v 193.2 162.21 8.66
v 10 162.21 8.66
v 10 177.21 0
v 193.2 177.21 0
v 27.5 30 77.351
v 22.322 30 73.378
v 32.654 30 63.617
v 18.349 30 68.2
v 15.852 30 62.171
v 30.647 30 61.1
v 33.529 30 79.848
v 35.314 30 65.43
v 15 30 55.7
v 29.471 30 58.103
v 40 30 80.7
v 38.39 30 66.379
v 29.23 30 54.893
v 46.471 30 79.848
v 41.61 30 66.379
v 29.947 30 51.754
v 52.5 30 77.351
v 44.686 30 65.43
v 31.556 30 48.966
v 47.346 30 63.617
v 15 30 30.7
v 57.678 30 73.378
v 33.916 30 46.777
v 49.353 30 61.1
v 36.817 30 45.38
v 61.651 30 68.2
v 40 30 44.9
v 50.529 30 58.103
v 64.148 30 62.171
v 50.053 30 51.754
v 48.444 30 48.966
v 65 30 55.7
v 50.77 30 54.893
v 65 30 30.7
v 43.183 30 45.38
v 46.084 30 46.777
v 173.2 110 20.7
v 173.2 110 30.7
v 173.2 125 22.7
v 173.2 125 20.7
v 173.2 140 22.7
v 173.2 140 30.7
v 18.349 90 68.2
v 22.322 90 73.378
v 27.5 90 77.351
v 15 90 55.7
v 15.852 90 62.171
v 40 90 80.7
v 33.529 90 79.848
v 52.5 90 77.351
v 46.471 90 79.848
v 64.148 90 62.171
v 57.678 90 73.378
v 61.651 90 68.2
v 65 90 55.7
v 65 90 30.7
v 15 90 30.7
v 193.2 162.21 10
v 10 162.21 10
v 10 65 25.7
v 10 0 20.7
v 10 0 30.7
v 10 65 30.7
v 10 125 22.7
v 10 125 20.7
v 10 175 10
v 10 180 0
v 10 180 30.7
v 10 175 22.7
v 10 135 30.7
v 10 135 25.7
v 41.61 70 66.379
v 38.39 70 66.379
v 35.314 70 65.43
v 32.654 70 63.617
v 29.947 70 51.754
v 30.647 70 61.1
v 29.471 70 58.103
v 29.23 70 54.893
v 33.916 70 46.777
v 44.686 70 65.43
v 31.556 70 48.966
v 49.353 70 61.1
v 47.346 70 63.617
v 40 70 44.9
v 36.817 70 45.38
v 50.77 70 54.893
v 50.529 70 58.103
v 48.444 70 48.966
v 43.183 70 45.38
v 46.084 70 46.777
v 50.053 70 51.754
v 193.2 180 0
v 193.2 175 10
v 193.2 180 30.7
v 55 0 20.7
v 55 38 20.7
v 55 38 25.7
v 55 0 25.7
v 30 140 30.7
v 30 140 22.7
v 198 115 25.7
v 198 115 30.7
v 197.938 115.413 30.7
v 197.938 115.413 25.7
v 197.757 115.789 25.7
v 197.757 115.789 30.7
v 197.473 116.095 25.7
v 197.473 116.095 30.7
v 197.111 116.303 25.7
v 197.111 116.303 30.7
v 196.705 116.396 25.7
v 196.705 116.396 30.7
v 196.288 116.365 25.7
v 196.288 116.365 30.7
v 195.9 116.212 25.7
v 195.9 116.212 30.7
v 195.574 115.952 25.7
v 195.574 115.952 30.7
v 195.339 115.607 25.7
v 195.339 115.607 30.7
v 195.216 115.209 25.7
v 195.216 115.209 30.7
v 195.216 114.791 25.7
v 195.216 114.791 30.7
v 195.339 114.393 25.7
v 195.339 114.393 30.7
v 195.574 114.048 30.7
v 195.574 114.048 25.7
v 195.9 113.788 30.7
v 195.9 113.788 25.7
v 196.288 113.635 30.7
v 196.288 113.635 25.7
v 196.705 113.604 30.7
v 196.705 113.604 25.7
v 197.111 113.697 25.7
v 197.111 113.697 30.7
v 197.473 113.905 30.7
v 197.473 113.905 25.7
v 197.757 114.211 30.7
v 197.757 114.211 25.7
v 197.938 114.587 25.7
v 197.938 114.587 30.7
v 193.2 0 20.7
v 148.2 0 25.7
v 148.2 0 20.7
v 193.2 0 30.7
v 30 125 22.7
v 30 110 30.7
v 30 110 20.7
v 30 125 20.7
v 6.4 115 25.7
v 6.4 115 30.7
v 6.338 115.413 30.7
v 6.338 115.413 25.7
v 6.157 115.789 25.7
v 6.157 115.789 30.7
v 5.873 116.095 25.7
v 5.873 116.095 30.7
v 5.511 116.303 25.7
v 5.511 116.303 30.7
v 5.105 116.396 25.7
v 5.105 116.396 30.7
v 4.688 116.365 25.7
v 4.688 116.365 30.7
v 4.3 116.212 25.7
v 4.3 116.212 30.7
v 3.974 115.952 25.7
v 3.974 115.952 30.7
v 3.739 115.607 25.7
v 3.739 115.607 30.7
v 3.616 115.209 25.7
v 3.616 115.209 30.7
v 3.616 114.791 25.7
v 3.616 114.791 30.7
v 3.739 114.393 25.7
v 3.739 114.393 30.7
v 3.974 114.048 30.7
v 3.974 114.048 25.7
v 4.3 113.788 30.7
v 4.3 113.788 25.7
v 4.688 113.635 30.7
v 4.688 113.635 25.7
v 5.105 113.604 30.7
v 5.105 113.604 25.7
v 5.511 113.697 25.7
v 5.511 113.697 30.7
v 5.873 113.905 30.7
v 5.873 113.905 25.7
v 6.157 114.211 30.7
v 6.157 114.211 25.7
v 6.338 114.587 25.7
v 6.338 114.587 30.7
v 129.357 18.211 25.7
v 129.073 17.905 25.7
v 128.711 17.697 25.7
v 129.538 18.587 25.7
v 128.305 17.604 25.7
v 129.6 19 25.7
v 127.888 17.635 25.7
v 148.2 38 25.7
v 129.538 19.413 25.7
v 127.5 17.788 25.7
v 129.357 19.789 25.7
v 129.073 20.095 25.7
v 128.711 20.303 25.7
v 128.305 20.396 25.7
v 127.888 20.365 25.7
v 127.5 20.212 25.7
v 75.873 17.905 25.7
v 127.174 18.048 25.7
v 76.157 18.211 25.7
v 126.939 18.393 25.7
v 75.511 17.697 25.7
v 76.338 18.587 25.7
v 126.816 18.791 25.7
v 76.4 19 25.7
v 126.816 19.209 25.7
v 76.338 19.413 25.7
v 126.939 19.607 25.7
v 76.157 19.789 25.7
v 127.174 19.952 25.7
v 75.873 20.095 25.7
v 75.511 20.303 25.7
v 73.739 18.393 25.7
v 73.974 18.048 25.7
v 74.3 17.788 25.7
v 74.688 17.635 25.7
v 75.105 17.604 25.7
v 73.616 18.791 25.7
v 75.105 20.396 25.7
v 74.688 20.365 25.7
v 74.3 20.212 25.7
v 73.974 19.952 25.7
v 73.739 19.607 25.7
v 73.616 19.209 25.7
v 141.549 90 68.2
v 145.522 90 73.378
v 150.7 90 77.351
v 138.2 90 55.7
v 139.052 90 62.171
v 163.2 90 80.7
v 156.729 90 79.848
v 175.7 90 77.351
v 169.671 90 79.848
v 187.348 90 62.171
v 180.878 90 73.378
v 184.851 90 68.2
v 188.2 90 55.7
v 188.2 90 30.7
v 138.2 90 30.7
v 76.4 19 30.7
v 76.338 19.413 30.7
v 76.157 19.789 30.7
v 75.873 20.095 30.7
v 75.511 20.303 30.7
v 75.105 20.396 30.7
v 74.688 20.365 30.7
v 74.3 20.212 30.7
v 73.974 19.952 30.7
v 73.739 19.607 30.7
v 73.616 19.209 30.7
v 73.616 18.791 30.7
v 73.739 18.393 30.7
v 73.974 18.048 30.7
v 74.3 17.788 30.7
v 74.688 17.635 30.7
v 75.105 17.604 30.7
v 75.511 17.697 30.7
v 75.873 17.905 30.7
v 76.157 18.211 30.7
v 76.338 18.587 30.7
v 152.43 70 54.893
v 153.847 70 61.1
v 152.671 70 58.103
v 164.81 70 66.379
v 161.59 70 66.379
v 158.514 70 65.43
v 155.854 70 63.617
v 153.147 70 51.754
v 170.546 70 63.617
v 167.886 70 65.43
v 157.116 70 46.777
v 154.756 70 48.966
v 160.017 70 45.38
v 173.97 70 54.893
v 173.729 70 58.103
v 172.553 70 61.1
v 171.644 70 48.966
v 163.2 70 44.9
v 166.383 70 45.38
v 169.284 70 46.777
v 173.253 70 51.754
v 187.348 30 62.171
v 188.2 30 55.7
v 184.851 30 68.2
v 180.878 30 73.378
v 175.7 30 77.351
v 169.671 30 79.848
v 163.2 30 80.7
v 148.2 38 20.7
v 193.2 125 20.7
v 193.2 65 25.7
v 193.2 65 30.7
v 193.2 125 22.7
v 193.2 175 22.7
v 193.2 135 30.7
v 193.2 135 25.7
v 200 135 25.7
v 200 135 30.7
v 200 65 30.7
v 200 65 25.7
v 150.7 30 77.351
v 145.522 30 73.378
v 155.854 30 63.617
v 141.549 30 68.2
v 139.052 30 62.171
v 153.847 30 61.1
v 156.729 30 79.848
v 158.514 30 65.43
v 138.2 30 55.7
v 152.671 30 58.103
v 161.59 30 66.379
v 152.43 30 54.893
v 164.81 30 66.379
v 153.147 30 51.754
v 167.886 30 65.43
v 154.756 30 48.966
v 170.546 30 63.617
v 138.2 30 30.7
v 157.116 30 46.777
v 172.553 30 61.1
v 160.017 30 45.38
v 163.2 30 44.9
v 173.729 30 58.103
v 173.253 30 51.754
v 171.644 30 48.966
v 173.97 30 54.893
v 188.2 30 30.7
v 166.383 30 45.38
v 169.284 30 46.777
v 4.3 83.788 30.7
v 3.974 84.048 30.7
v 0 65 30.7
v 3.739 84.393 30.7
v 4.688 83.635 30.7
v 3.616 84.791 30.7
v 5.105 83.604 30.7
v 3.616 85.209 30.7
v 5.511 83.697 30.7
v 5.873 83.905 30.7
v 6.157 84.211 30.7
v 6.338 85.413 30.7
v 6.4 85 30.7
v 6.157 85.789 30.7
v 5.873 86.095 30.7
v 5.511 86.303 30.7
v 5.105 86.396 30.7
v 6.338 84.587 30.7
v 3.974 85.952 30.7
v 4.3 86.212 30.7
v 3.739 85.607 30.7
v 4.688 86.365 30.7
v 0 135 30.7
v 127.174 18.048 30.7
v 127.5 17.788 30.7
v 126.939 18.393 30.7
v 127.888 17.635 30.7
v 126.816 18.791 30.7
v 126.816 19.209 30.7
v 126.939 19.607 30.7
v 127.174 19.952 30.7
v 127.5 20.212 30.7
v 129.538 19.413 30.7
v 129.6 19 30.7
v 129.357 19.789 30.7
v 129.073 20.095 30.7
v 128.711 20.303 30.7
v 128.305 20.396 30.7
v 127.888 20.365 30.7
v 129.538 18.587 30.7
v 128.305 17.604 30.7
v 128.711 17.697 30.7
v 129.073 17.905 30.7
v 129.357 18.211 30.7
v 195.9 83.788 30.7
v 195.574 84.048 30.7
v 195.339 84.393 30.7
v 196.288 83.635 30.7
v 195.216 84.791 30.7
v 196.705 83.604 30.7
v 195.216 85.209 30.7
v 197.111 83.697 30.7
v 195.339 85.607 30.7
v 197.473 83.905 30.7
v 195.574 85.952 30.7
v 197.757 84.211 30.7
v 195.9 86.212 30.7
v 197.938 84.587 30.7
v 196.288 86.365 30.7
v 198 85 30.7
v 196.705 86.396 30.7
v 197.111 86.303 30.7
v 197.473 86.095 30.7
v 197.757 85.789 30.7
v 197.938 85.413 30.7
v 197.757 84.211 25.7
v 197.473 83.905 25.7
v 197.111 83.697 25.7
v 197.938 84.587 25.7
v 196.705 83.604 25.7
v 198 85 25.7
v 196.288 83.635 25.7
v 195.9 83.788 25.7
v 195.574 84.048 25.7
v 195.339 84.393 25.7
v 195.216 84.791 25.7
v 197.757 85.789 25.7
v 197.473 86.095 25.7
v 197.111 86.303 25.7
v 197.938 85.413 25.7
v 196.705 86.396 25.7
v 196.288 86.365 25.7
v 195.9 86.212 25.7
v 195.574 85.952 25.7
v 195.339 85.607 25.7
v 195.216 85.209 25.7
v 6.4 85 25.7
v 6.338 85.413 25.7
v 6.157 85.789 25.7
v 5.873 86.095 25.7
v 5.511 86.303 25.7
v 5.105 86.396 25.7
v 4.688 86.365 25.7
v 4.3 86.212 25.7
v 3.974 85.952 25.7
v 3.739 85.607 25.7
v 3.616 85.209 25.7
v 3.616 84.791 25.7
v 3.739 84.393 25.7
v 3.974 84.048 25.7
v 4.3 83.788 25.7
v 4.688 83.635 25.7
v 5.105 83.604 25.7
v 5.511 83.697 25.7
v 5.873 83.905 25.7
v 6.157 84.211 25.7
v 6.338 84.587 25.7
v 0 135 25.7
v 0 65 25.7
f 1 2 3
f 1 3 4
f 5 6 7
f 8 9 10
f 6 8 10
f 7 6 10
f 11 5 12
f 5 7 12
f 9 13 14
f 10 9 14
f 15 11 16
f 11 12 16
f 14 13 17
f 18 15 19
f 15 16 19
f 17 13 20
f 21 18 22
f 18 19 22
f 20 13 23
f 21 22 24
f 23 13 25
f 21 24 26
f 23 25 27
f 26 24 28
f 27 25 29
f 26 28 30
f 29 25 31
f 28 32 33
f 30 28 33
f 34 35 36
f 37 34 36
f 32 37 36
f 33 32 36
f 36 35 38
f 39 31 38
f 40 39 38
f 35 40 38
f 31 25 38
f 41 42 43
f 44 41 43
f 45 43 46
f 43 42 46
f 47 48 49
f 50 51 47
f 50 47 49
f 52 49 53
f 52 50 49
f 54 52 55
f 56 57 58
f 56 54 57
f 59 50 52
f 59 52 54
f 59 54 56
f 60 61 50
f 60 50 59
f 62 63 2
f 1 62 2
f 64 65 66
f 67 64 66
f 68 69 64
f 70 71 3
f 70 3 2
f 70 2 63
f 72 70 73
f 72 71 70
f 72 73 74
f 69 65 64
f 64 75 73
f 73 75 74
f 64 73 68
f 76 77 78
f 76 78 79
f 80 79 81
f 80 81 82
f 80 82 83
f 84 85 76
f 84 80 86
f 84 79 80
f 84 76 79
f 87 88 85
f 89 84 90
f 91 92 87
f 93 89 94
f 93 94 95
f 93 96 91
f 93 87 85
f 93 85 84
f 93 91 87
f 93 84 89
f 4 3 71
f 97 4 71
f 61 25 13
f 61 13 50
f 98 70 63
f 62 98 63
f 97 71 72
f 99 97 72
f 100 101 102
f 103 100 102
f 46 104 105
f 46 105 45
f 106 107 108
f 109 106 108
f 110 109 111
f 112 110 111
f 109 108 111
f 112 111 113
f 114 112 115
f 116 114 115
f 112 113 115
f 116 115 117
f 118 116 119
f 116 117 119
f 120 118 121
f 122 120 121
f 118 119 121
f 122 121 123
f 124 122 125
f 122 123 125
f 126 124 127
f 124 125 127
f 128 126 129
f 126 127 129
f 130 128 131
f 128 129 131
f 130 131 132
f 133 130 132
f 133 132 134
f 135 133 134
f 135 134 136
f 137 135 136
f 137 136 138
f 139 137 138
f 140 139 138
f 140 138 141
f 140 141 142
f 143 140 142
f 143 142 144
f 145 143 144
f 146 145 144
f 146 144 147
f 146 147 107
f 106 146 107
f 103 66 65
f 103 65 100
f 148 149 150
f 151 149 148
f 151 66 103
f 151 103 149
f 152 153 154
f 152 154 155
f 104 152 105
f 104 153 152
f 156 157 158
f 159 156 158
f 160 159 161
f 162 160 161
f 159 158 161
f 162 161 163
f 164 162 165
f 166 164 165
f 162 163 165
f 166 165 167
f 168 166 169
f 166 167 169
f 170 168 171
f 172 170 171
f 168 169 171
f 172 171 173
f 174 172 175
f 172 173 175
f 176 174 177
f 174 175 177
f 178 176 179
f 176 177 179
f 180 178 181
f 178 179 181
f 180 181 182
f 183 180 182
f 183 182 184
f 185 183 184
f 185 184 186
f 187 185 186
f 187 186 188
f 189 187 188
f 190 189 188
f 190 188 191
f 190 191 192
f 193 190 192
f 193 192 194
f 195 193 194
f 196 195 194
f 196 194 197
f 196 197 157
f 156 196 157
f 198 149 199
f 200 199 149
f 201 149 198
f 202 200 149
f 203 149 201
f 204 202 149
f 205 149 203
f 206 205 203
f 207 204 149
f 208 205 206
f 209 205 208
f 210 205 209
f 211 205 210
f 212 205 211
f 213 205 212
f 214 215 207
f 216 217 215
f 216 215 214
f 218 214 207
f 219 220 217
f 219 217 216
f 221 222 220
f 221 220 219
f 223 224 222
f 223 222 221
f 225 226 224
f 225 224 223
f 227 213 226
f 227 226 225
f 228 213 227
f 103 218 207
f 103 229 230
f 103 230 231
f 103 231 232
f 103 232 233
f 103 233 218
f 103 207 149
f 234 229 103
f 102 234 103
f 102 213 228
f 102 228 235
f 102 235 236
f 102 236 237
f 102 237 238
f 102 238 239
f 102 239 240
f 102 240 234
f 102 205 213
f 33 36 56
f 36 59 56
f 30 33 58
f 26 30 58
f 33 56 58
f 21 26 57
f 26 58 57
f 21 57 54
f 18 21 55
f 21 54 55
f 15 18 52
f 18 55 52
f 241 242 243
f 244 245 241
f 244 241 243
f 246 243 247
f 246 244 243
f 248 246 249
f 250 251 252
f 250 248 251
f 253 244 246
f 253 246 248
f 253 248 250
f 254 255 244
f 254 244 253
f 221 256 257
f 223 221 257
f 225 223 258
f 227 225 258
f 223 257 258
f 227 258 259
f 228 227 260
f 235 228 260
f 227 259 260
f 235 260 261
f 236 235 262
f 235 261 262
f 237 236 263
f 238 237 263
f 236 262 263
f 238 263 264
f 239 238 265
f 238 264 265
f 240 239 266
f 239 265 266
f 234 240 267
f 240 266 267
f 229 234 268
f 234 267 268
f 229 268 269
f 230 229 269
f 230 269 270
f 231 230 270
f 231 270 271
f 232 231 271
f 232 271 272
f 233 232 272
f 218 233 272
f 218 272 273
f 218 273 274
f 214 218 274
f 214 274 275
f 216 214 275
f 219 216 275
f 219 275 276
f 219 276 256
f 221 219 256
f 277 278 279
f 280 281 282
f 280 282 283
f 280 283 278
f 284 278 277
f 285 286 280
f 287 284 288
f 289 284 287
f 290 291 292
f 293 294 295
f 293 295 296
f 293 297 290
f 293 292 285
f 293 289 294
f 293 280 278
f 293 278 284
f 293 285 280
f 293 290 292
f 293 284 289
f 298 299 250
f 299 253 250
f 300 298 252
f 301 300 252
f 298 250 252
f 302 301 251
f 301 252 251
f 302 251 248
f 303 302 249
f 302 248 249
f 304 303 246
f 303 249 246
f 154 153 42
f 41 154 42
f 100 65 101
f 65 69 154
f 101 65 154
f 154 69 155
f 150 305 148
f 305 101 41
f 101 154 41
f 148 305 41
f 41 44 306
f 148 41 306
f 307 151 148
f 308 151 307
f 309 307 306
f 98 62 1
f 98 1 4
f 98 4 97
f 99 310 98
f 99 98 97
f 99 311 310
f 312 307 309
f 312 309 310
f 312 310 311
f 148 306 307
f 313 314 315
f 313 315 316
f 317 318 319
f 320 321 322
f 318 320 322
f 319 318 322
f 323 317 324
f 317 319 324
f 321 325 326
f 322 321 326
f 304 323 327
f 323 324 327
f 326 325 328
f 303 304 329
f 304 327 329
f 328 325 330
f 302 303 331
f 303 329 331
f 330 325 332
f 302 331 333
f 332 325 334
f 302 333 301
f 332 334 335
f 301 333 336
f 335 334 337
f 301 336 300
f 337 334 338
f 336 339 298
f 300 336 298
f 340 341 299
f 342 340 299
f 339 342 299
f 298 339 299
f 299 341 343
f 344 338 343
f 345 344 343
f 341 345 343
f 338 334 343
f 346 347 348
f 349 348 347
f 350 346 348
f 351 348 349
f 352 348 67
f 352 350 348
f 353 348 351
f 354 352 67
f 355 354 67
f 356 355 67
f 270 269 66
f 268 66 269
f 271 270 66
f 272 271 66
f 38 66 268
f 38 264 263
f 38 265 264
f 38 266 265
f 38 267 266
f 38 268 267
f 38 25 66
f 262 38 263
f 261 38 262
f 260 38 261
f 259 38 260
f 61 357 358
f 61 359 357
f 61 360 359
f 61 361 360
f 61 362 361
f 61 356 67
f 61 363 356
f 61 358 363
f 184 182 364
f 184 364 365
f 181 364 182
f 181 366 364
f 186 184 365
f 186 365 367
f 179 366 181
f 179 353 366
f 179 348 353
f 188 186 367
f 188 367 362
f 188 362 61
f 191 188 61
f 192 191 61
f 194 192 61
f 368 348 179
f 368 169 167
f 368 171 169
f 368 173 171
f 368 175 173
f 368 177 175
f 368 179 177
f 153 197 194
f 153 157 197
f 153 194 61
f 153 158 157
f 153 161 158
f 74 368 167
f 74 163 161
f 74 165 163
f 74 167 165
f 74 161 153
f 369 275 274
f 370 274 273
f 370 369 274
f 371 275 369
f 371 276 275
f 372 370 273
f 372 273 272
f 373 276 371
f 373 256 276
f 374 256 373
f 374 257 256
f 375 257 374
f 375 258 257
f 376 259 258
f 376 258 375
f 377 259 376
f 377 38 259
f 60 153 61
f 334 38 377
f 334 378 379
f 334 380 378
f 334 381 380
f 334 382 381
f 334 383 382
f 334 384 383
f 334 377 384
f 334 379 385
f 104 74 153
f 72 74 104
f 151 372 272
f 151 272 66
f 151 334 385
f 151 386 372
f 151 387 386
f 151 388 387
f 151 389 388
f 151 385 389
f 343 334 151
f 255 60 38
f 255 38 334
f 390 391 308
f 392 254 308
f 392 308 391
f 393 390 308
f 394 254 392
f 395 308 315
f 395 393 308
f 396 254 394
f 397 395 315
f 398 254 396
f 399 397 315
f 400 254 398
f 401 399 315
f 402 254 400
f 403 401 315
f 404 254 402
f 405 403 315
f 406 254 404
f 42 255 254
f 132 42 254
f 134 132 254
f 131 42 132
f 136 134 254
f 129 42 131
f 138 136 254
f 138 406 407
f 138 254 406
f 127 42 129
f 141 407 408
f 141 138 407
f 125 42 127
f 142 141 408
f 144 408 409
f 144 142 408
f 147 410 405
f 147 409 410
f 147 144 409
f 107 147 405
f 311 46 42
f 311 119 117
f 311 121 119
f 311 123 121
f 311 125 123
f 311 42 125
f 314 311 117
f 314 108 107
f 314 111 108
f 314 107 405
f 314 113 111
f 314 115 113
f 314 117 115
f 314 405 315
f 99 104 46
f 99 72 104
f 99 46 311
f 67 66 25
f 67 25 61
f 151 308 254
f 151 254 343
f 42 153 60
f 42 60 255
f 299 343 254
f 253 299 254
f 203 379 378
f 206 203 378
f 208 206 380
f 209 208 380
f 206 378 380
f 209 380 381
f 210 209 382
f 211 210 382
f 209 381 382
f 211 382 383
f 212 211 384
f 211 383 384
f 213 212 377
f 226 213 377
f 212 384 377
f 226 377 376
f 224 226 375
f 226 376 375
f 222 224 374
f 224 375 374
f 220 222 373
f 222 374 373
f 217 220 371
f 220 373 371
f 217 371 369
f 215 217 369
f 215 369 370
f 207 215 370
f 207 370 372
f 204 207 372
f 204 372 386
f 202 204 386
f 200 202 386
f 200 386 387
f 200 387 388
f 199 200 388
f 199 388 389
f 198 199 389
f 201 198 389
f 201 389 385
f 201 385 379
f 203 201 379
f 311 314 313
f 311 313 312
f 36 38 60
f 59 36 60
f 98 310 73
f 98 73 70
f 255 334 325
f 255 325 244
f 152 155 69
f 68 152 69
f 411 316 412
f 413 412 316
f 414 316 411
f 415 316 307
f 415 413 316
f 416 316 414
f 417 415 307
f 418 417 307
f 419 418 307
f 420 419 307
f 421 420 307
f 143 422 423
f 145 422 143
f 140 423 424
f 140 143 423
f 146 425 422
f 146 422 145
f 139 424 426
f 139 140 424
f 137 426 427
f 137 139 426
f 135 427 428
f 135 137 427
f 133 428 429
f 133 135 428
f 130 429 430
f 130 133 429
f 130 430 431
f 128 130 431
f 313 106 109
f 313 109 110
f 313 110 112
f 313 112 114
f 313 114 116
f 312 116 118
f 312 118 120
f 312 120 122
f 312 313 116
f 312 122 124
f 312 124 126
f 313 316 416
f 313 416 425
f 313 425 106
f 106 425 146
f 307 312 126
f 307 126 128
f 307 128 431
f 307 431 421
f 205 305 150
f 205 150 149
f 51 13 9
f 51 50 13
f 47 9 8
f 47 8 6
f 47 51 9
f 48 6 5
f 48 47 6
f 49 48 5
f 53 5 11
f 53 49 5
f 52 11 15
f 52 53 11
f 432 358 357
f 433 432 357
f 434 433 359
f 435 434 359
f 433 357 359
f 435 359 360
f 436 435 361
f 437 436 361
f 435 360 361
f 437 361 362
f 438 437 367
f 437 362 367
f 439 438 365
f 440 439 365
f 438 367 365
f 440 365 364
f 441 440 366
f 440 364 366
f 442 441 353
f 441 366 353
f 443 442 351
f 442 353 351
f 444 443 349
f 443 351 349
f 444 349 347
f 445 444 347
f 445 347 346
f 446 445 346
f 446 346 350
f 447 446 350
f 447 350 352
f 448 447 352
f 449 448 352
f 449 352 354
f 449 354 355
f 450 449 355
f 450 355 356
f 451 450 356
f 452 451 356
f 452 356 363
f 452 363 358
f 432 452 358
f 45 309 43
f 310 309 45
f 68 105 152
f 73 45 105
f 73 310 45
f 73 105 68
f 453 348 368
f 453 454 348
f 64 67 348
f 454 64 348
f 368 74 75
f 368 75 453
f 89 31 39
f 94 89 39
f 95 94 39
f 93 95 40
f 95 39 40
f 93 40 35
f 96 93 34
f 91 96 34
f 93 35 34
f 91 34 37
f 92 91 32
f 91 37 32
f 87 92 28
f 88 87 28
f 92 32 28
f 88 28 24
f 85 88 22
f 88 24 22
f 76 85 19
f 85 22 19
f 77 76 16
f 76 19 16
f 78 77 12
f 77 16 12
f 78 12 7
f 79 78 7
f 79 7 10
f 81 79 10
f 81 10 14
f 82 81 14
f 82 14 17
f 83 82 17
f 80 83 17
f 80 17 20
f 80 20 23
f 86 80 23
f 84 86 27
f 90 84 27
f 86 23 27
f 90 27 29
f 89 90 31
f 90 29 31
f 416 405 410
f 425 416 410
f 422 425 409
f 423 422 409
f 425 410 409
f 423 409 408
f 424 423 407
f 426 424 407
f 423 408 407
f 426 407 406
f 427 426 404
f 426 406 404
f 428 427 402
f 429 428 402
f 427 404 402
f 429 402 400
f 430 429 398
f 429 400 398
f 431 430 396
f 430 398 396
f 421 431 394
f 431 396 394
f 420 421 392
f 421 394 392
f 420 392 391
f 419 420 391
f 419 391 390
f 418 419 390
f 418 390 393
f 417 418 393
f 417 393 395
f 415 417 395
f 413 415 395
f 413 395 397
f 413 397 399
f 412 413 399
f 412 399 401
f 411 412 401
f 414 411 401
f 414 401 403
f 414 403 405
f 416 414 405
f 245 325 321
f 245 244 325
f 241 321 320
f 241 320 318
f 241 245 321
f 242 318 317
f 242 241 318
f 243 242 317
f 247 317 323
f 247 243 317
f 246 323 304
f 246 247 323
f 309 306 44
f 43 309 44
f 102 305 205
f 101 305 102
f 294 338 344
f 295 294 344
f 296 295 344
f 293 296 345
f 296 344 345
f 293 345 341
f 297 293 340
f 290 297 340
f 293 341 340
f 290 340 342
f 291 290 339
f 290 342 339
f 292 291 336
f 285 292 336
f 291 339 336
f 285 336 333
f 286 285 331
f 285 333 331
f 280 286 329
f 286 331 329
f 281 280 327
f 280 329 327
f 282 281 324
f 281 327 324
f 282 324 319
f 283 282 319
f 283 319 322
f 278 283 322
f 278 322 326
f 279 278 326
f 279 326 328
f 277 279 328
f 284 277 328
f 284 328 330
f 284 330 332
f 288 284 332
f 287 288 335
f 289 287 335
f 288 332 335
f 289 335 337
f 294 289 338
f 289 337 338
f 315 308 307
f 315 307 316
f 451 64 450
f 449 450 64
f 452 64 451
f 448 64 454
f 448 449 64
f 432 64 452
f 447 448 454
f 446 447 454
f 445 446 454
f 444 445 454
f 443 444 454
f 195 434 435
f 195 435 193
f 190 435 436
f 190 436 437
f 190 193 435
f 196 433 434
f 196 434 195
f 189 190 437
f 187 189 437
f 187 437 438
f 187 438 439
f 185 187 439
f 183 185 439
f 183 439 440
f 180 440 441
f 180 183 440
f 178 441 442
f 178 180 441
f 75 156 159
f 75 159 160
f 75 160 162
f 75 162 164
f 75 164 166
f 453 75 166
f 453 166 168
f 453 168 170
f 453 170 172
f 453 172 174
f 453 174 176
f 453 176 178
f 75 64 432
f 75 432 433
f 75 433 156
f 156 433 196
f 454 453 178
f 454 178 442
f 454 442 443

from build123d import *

# Parameters (mm, degrees)
CROQUIS1_W                 = 180
CROQUIS1_H                 = 180
SALIENTE_EXTRUIR1_DEPTH    = 30.7
CROQUIS2_W                 = 180
CROQUIS2_H                 = 162.21
CORTAR_EXTRUIR1_DEPTH      = 20.7
CROQUIS3_W                 = 10.7
CROQUIS3_H                 = 12.79
CORTAR_EXTRUIR2_DEPTH      = 274.7
SALIENTE_EXTRUIR2_DEPTH    = 20
CORTAR_EXTRUIR3_DEPTH      = 147
CORTAR_EXTRUIR3_DEPTH_BACK = 147
CROQUIS5_W                 = 10
CROQUIS5_H                 = 45
CROQUIS5_W_2               = 6.8
CROQUIS6_W                 = 93.2
CROQUIS6_H                 = 38
CROQUIS6_W_2               = 6.8
CROQUIS6_H_2               = 70
CROQUIS6_W_3               = 10
CORTAR_EXTRUIR4_DEPTH      = 5
CROQUIS7_W                 = 183.2
CROQUIS7_H                 = 50
CORTAR_EXTRUIR5_DEPTH      = 2
CROQUIS8_W                 = 45
CROQUIS8_H                 = 10
SALIENTE_EXTRUIR3_DEPTH    = 38
CROQUIS9_R                 = 1.4
CROQUIS9_W                 = 143.2
CROQUIS9_H                 = 30
CORTAR_EXTRUIR6_DEPTH      = 20
CHAFL_N1_SIZE              = 15
CHAFL_N1_SIZE2             = 8.660254038
CROQUIS10_W                = 50
CROQUIS10_H                = 60
SALIENTE_EXTRUIR4_DEPTH    = 50
REDONDEO1_R                = 25
CROQUIS11_R                = 10.8
CORTAR_EXTRUIR7_DEPTH      = 40


with BuildPart() as part:
    # Croquis1 → Saliente-Extruir1 (new body)
    with BuildSketch(Plane.XY):
        with Locations((90, 90)):
            Rectangle(CROQUIS1_W, CROQUIS1_H)
    extrude(amount=SALIENTE_EXTRUIR1_DEPTH)

    # Croquis2 → Cortar-Extruir1 (cut)
    with BuildSketch(Plane(origin=(0, 0, 0), x_dir=(-1, 0, 0), z_dir=(0, 0, -1))):
        with Locations((-90, 81.105)):
            Rectangle(CROQUIS2_W, CROQUIS2_H)
    extrude(amount=-CORTAR_EXTRUIR1_DEPTH, mode=Mode.SUBTRACT)

    # Croquis3 → Cortar-Extruir2 (cut)
    with BuildSketch(Plane.ZY):
        with Locations((15.35, 168.605)):
            Rectangle(CROQUIS3_W, CROQUIS3_H)
    extrude(amount=-CORTAR_EXTRUIR2_DEPTH, mode=Mode.SUBTRACT)

    # Croquis4 → Saliente-Extruir2 (add)
    with BuildSketch(Plane(origin=(180, 0, 0), x_dir=(0, 0, -1), z_dir=(1, 0, 0))):
        Polygon((-20.7, 0), (-20.7, 175), (-10, 175), (-10, 162.21), (0, 162.21), (0, 180), (-30.7, 180), (-30.7, 0), align=None)
    extrude(amount=SALIENTE_EXTRUIR2_DEPTH)

    # Croquis5 → Cortar-Extruir3 (cut, two sides: drawn at the far end of the back side and taken through both)
    with BuildSketch(Plane(origin=(0, 0, 20.7), x_dir=(-1, 0, 0), z_dir=(0, 0, -1)).offset(-CORTAR_EXTRUIR3_DEPTH_BACK)):
        Polygon((-55, 38), (-10, 38), (-10, 65), (0, 65), (0, 38), (0, 0), (-55, 0), align=None)
        Polygon((-148.2, 38), (-193.2, 38), (-193.2, 65), (-200, 65), (-200, 38), (-200, 0), (-148.2, 0), align=None)
        with Locations((-5, 157.5)):
            Rectangle(CROQUIS5_W, CROQUIS5_H)
        with Locations((-196.6, 157.5)):
            Rectangle(CROQUIS5_W_2, CROQUIS5_H)
    extrude(amount=CORTAR_EXTRUIR3_DEPTH + CORTAR_EXTRUIR3_DEPTH_BACK, mode=Mode.SUBTRACT)

    # Croquis6 → Cortar-Extruir4 (cut)
    with BuildSketch(Plane(origin=(0, 0, 20.7), x_dir=(-1, 0, 0), z_dir=(0, 0, -1))):
        with Locations((-101.6, 19)):
            Rectangle(CROQUIS6_W, CROQUIS6_H)
        with Locations((-196.6, 100)):
            Rectangle(CROQUIS6_W_2, CROQUIS6_H_2)
        with Locations((-5, 100)):
            Rectangle(CROQUIS6_W_3, CROQUIS6_H_2)
    extrude(amount=-CORTAR_EXTRUIR4_DEPTH, mode=Mode.SUBTRACT)

    # Croquis7 → Cortar-Extruir5 (cut)
    with BuildSketch(Plane(origin=(0, 0, 20.7), x_dir=(-1, 0, 0), z_dir=(0, 0, -1))):
        with Locations((-101.6, 150)):
            Rectangle(CROQUIS7_W, CROQUIS7_H)
    extrude(amount=-CORTAR_EXTRUIR5_DEPTH, mode=Mode.SUBTRACT)

    # Croquis8 → Saliente-Extruir3 (add)
    with BuildSketch(Plane.XZ.offset(-38)):
        with Locations((32.5, 25.7)):
            Rectangle(CROQUIS8_W, CROQUIS8_H)
        with Locations((170.7, 25.7)):
            Rectangle(CROQUIS8_W, CROQUIS8_H)
    extrude(amount=SALIENTE_EXTRUIR3_DEPTH)

    # Croquis9 → Cortar-Extruir6 (cut)
    with BuildSketch(Plane.XY.offset(30.7)):
        with Locations((5, 115)):
            Circle(CROQUIS9_R)
        with Locations((5, 85)):
            Circle(CROQUIS9_R)
        with Locations((196.6, 115)):
            Circle(CROQUIS9_R)
        with Locations((196.6, 85)):
            Circle(CROQUIS9_R)
        with Locations((128.2, 19)):
            Circle(CROQUIS9_R)
        with Locations((75, 19)):
            Circle(CROQUIS9_R)
        with Locations((101.6, 125)):
            Rectangle(CROQUIS9_W, CROQUIS9_H)
    extrude(amount=-CORTAR_EXTRUIR6_DEPTH, mode=Mode.SUBTRACT)

    # Chaflán1
    chafl_n1_edges = [part.edges().sort_by_distance(p)[0] for p in [
        (101.6, 162.21, 0),
    ]]
    chafl_n1_side = [part.faces().sort_by_distance(p)[0] for p in [
        (101.6, 171.105, 0),
    ]]
    chamfer(chafl_n1_edges, length=CHAFL_N1_SIZE, length2=CHAFL_N1_SIZE2, reference=chafl_n1_side[0])

    # Croquis10 → Saliente-Extruir4 (add)
    with BuildSketch(Plane.XY.offset(30.7)):
        with Locations((163.2, 60)):
            Rectangle(CROQUIS10_W, CROQUIS10_H)
        with Locations((40, 60)):
            Rectangle(CROQUIS10_W, CROQUIS10_H)
    extrude(amount=SALIENTE_EXTRUIR4_DEPTH)

    # Redondeo1
    redondeo1_edges = [part.edges().sort_by_distance(p)[0] for p in [
        (15, 60, 80.7),
        (65, 60, 80.7),
        (138.2, 60, 80.7),
        (188.2, 60, 80.7),
    ]]
    fillet(redondeo1_edges, radius=REDONDEO1_R - 0.0001)  # a hair under: the kernel refuses the full size

    # Croquis11 → Cortar-Extruir7 (cut)
    with BuildSketch(Plane.XZ.offset(-30)):
        with Locations(Location((163.2, 55.7, 0), (0, 0, 270))):
            Circle(CROQUIS11_R)
        with Locations(Location((40, 55.7, 0), (0, 0, 270))):
            Circle(CROQUIS11_R)
    extrude(amount=-CORTAR_EXTRUIR7_DEPTH, mode=Mode.SUBTRACT)


solid = part.part
